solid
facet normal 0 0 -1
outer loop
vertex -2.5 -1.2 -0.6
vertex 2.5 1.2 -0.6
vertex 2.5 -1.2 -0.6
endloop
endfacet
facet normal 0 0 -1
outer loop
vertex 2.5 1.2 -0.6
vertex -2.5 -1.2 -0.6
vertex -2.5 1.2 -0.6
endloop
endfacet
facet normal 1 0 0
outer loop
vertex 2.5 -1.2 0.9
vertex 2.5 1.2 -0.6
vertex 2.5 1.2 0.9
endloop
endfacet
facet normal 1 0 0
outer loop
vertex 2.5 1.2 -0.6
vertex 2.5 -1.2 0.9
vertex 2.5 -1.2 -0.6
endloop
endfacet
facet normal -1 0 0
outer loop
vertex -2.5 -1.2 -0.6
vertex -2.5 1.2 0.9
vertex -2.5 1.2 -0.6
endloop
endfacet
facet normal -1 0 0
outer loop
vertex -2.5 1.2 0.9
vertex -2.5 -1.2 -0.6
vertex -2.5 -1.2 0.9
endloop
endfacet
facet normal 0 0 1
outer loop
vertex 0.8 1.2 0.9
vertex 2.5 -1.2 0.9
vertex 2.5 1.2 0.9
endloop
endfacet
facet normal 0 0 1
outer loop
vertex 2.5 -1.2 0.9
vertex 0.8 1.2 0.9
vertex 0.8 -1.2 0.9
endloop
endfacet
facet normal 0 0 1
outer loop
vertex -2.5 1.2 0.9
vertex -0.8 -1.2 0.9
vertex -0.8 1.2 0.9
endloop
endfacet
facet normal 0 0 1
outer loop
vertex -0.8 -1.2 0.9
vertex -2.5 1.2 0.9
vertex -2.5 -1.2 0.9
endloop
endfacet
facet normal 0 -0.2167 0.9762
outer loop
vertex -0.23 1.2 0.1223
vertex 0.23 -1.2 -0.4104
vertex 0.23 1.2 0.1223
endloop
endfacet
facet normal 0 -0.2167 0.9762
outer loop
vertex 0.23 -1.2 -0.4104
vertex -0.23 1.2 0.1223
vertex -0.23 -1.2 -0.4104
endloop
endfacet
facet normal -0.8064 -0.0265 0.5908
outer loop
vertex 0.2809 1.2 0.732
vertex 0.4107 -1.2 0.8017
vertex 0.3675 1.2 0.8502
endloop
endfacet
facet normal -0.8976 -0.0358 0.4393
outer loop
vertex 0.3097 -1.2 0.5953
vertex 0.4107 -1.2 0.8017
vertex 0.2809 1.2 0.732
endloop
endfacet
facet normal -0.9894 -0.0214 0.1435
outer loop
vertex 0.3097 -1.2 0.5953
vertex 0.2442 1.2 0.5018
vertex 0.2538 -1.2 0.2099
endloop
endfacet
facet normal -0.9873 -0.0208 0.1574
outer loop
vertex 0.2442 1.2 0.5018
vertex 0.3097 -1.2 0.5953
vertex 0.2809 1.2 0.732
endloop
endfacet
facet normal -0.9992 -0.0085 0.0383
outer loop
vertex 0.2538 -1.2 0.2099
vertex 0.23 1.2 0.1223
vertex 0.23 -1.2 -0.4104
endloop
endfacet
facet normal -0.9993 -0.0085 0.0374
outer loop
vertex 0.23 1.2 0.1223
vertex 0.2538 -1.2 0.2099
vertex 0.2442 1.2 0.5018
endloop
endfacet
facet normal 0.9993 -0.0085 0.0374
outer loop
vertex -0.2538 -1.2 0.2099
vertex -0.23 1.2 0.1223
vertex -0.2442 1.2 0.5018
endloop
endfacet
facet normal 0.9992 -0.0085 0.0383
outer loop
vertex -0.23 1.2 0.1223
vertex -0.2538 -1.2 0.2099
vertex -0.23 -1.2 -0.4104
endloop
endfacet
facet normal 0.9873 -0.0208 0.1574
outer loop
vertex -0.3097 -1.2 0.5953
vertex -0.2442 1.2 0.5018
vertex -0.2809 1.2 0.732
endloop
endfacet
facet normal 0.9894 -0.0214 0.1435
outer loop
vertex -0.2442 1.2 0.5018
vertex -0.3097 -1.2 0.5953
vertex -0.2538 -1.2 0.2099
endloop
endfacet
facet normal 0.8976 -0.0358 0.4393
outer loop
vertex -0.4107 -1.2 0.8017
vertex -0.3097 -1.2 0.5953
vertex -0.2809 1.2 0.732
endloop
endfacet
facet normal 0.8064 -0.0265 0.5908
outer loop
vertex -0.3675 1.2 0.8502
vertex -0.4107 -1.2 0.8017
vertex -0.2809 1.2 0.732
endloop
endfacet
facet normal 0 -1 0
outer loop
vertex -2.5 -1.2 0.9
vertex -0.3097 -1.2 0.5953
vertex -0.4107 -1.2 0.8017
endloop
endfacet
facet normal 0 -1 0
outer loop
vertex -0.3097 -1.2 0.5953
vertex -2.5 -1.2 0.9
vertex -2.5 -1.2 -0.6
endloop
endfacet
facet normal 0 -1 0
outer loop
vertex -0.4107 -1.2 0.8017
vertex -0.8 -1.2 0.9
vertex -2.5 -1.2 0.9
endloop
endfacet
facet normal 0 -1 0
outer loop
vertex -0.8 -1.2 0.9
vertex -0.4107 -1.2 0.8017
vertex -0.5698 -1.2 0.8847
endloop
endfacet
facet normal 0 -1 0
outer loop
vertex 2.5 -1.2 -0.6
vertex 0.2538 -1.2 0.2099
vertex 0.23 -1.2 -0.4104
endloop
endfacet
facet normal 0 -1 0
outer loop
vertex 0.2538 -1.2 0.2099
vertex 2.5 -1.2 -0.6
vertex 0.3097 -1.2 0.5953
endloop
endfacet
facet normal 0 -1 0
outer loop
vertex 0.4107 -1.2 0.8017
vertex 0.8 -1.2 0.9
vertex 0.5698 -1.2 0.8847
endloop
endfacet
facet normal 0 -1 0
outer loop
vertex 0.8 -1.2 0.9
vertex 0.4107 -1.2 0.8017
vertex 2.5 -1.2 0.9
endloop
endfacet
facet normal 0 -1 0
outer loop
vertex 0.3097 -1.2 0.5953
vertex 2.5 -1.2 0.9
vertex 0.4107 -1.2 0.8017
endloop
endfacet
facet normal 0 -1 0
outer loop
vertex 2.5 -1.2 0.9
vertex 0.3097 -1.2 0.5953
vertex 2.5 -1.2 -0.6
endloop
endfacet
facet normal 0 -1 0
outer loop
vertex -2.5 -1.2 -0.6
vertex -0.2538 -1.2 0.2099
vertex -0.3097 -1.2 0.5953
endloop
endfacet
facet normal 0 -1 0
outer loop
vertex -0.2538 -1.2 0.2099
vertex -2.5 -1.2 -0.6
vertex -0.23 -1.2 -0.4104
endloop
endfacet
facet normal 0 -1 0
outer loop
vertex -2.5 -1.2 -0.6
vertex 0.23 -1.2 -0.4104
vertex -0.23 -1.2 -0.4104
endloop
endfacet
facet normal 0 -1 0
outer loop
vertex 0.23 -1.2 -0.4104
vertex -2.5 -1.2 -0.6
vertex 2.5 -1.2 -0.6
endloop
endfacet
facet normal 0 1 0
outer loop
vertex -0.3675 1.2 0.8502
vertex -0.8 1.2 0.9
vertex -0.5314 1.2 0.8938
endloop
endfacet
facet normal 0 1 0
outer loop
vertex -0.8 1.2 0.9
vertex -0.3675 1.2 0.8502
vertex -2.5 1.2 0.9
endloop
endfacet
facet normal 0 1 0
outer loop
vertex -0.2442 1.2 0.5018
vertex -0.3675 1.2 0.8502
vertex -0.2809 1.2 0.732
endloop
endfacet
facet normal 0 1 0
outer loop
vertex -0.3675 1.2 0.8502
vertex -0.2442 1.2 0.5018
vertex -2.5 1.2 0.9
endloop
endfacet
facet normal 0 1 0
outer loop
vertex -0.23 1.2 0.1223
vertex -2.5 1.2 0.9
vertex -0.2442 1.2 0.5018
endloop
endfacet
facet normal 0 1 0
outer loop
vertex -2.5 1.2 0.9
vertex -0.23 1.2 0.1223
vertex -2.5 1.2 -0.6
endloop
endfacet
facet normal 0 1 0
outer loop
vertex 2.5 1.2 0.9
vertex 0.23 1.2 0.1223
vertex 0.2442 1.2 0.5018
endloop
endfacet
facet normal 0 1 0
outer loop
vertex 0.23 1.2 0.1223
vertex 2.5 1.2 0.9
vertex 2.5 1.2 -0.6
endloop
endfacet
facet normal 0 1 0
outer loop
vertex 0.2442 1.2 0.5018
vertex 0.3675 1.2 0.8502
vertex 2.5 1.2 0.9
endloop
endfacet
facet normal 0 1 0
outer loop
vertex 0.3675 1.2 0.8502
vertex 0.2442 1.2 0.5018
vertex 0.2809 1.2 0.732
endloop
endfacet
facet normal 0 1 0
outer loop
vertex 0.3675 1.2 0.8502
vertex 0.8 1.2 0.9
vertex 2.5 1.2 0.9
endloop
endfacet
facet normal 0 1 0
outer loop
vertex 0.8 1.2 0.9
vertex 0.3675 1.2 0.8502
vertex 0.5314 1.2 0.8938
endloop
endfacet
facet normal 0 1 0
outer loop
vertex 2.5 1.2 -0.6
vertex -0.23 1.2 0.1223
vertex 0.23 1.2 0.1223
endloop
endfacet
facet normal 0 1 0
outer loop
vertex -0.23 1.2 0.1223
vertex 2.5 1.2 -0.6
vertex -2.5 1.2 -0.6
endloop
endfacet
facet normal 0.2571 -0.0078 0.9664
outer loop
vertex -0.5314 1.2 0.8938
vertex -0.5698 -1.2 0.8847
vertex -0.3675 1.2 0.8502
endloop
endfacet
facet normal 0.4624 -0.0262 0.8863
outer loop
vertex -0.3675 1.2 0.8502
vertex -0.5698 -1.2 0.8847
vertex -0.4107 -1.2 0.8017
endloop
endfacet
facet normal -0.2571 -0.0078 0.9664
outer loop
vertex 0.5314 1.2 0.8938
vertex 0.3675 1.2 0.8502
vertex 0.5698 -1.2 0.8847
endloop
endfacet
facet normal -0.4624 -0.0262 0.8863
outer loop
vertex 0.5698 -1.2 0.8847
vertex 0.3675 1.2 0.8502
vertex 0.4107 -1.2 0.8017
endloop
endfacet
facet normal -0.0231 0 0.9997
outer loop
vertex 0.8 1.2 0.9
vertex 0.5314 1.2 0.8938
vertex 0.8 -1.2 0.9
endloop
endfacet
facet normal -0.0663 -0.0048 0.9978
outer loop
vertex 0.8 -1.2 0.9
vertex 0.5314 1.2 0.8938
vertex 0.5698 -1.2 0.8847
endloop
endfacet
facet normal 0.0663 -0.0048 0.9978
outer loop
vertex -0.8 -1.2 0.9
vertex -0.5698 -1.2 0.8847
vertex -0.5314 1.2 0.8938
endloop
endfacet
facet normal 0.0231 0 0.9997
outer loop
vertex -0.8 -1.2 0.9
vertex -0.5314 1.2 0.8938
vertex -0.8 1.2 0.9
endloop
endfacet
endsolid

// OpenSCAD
// file: ../p/rect2p.scad
use <../lib.scad>
function ldraw_lib__rect2p() = [
// 0 Rectangle with 2 Parallel Edges
// 0 Name: rect2p.dat
// 0 Author: Donald Sutter [technog]
// 0 !LDRAW_ORG Primitive UPDATE 2010-01
// 0 !LICENSE Licensed under CC BY 4.0 : see CAreadme.txt
// 
// 0 BFC CERTIFY CCW
  [0,"BFC","CERTIFY"],
  [0,"BFC","CCW"],
// 
// 0 !HISTORY 2003-08-01 [PTadmin] Official Update 2003-02
// 0 !HISTORY 2007-06-24 [PTadmin] Header formatted for Contributor Agreement
// 0 !HISTORY 2008-07-01 [PTadmin] Official Update 2008-01
// 0 !HISTORY 2010-01-17 [mikeheide] changed winding to CCW
// 0 !HISTORY 2010-04-05 [PTadmin] Official Update 2010-01
// 
// 
// 2 24 1 0 1 -1 0 1
  [2,24,1,0,1,-1,0,1],
// 2 24 -1 0 -1 1 0 -1
  [2,24,-1,0,-1,1,0,-1],
// 4 16 -1 0 1 -1 0 -1 1 0 -1 1 0 1
  [4,16,-1,0,1,-1,0,-1,1,0,-1,1,0,1],
// 0
];
module ldraw_lib__rect2p(step=0, col=false, unit=2/5, alt=false, line=0.2, solid=!$preview)
    makepoly(ldraw_lib__rect2p(), step=step, col=col, unit=unit, alt=alt, line=line, solid=solid);
ldraw_lib__rect2p(line=0.2);
// file: ../p/rect.scad
use <../lib.scad>
function ldraw_lib__rect() = [
// 0 Rectangle
// 0 Name: rect.dat
// 0 Author: James Jessiman
// 0 !LDRAW_ORG Primitive UPDATE 2010-01
// 0 !LICENSE Licensed under CC BY 4.0 : see CAreadme.txt
// 
// 0 BFC CERTIFY CCW
  [0,"BFC","CERTIFY"],
  [0,"BFC","CCW"],
// 
// 0 !HISTORY 2002-04-05 [hafhead] Added BFC statement
// 0 !HISTORY 2002-04-25 [PTadmin] Official Update 2002-02
// 0 !HISTORY 2007-06-24 [PTadmin] Header formatted for Contributor Agreement
// 0 !HISTORY 2008-07-01 [PTadmin] Official Update 2008-01
// 0 !HISTORY 2010-01-17 [mikeheide] changed winding to CCW
// 0 !HISTORY 2010-04-05 [PTadmin] Official Update 2010-01
// 
// 
// 2 24 1 0 1 -1 0 1
  [2,24,1,0,1,-1,0,1],
// 2 24 -1 0 1 -1 0 -1
  [2,24,-1,0,1,-1,0,-1],
// 2 24 -1 0 -1 1 0 -1
  [2,24,-1,0,-1,1,0,-1],
// 2 24 1 0 -1 1 0 1
  [2,24,1,0,-1,1,0,1],
// 4 16 -1 0 1 -1 0 -1 1 0 -1 1 0 1
  [4,16,-1,0,1,-1,0,-1,1,0,-1,1,0,1],
// 0
];
module ldraw_lib__rect(step=0, col=false, unit=2/5, alt=false, line=0.2, solid=!$preview)
    makepoly(ldraw_lib__rect(), step=step, col=col, unit=unit, alt=alt, line=line, solid=solid);
ldraw_lib__rect(line=0.2);
// file: ../p/box3u2p.scad
use <../lib.scad>
function ldraw_lib__box3u2p() = [
// 0 Box with 3 Faces without 2 Parallel Edges
// 0 Name: box3u2p.dat
// 0 Author: Niels Karsdorp [nielsk]
// 0 !LDRAW_ORG Primitive UPDATE 2012-01
// 0 !LICENSE Licensed under CC BY 4.0 : see CAreadme.txt
// 
// 0 BFC CERTIFY CCW
  [0,"BFC","CERTIFY"],
  [0,"BFC","CCW"],
// 
// 0 !HISTORY 2003-03-12 [PTadmin] Official Update 2003-01
// 0 !HISTORY 2007-06-24 [PTadmin] Header formatted for Contributor Agreement
// 0 !HISTORY 2008-07-01 [PTadmin] Official Update 2008-01
// 0 !HISTORY 2012-02-16 [Philo] Changed to CCW
// 0 !HISTORY 2012-03-30 [PTadmin] Official Update 2012-01
// 
// 
// 2 24 1 1 1 -1 1 1
  [2,24,1,1,1,-1,1,1],
// 2 24 -1 1 -1 1 1 -1
  [2,24,-1,1,-1,1,1,-1],
// 2 24 1 0 1 -1 0 1
  [2,24,1,0,1,-1,0,1],
// 2 24 -1 0 -1 1 0 -1
  [2,24,-1,0,-1,1,0,-1],
// 2 24 1 1 1 1 1 -1
  [2,24,1,1,1,1,1,-1],
// 2 24 -1 1 1 -1 1 -1
  [2,24,-1,1,1,-1,1,-1],
// 2 24 1 1 1 1 0 1
  [2,24,1,1,1,1,0,1],
// 2 24 1 1 -1 1 0 -1
  [2,24,1,1,-1,1,0,-1],
// 2 24 -1 1 1 -1 0 1
  [2,24,-1,1,1,-1,0,1],
// 2 24 -1 1 -1 -1 0 -1
  [2,24,-1,1,-1,-1,0,-1],
// 4 16 -1 1 -1 -1 1 1 1 1 1 1 1 -1
  [4,16,-1,1,-1,-1,1,1,1,1,1,1,1,-1],
// 4 16 -1 1 1 -1 0 1 1 0 1 1 1 1
  [4,16,-1,1,1,-1,0,1,1,0,1,1,1,1],
// 4 16 1 1 -1 1 0 -1 -1 0 -1 -1 1 -1
  [4,16,1,1,-1,1,0,-1,-1,0,-1,-1,1,-1],
];
module ldraw_lib__box3u2p(step=0, col=false, unit=2/5, alt=false, line=0.2, solid=!$preview)
    makepoly(ldraw_lib__box3u2p(), step=step, col=col, unit=unit, alt=alt, line=line, solid=solid);
ldraw_lib__box3u2p(line=0.2);
// main file
use <../lib.scad>
use <../p/box3u2p.scad>
use <../p/rect.scad>
use <../p/rect2p.scad>
function ldraw_lib__u9431() = [
// 0 ~Electric Constraction Eyes  4.5 x  2 x  1.5 Light-Up Sponge for LED Anode
// 0 Name: u9431.dat
// 0 Author: Santeri Piippo [arezey]
// 0 !LDRAW_ORG Part UPDATE 2024-05
// 0 !LICENSE Licensed under CC BY 4.0 : see CAreadme.txt
// 
// 0 !HELP Keeps the LED's anode away from the battery while the button is not pressed.
// 
// 0 BFC CERTIFY CCW
  [0,"BFC","CERTIFY"],
  [0,"BFC","CCW"],
// 
// 0 !HISTORY 2023-05-30 [SwampKryakwa] Changed triangulation to avoid convex faces, changed condlines to appear properly, use of rect and box primitives.
// 0 !HISTORY 2024-06-30 [OrionP] Official Update 2024-05
// 
// 
// 1 16 0 -2.25 0 0 0 6.25 0 3.75 0 3 0 0 box3u2p.dat
  [1,16,0,-2.25,0,0,0,6.25,0,3.75,0,3,0,0, ldraw_lib__box3u2p()],
// 1 16 4.125 -2.25 0 2.125 0 0 0 1 0 0 0 3 rect2p.dat
  [1,16,4.125,-2.25,0,2.125,0,0,0,1,0,0,0,3, ldraw_lib__rect2p()],
// 1 16 -4.125 -2.25 0 2.125 0 0 0 1 0 0 0 3 rect2p.dat
  [1,16,-4.125,-2.25,0,2.125,0,0,0,1,0,0,0,3, ldraw_lib__rect2p()],
// 1 16 0 0.360165 0 0.575 0 0 0 1 -0.665935 0 0 3 rect.dat
  [1,16,0,0.360165,0,0.575,0,0,0,1,-0.665935,0,0,3, ldraw_lib__rect()],
// 
// 2 24 1.3286 -2.23445 3 2 -2.25 3
  [2,24,1.3286,-2.23445,3,2,-2.25,3],
// 2 24 0.9188 -2.12557 3 1.3286 -2.23445 3
  [2,24,0.9188,-2.12557,3,1.3286,-2.23445,3],
// 2 24 0.7022 -1.83005 3 0.9188 -2.12557 3
  [2,24,0.7022,-1.83005,3,0.9188,-2.12557,3],
// 2 24 0.6104 -1.25455 3 0.7022 -1.83005 3
  [2,24,0.6104,-1.25455,3,0.7022,-1.83005,3],
// 2 24 0.575 -0.30577 3 0.6104 -1.25455 3
  [2,24,0.575,-0.30577,3,0.6104,-1.25455,3],
// 2 24 -0.575 -0.30577 3 -0.6104 -1.25455 3
  [2,24,-0.575,-0.30577,3,-0.6104,-1.25455,3],
// 2 24 -0.6104 -1.25455 3 -0.7022 -1.83005 3
  [2,24,-0.6104,-1.25455,3,-0.7022,-1.83005,3],
// 2 24 -0.7022 -1.83005 3 -0.9188 -2.12557 3
  [2,24,-0.7022,-1.83005,3,-0.9188,-2.12557,3],
// 2 24 -0.9188 -2.12557 3 -1.3286 -2.23445 3
  [2,24,-0.9188,-2.12557,3,-1.3286,-2.23445,3],
// 2 24 -1.3286 -2.23445 3 -2 -2.25 3
  [2,24,-1.3286,-2.23445,3,-2,-2.25,3],
// 2 24 1.4246 -2.21179 -3 2 -2.25 -3
  [2,24,1.4246,-2.21179,-3,2,-2.25,-3],
// 
// 2 24 1.0268 -2.00433 -3 1.4246 -2.21179 -3
  [2,24,1.0268,-2.00433,-3,1.4246,-2.21179,-3],
// 2 24 0.7742 -1.48836 -3 1.0268 -2.00433 -3
  [2,24,0.7742,-1.48836,-3,1.0268,-2.00433,-3],
// 2 24 0.6344 -0.524637 -3 0.7742 -1.48836 -3
  [2,24,0.6344,-0.524637,-3,0.7742,-1.48836,-3],
// 2 24 0.575 1.0261 -3 0.6344 -0.524637 -3
  [2,24,0.575,1.0261,-3,0.6344,-0.524637,-3],
// 2 24 -0.575 1.0261 -3 -0.6344 -0.524637 -3
  [2,24,-0.575,1.0261,-3,-0.6344,-0.524637,-3],
// 2 24 -0.6344 -0.524637 -3 -0.7742 -1.48836 -3
  [2,24,-0.6344,-0.524637,-3,-0.7742,-1.48836,-3],
// 2 24 -0.7742 -1.48836 -3 -1.0268 -2.00433 -3
  [2,24,-0.7742,-1.48836,-3,-1.0268,-2.00433,-3],
// 2 24 -1.0268 -2.00433 -3 -1.4246 -2.21179 -3
  [2,24,-1.0268,-2.00433,-3,-1.4246,-2.21179,-3],
// 2 24 -1.4246 -2.21179 -3 -2 -2.25 -3
  [2,24,-1.4246,-2.21179,-3,-2,-2.25,-3],
// 3 16 0.7022 -1.83005 3 1.0268 -2.00433 -3 0.9188 -2.12557 3
  [3,16,0.7022,-1.83005,3,1.0268,-2.00433,-3,0.9188,-2.12557,3],
// 3 16 0.7742 -1.48836 -3 1.0268 -2.00433 -3 0.7022 -1.83005 3
  [3,16,0.7742,-1.48836,-3,1.0268,-2.00433,-3,0.7022,-1.83005,3],
// 4 16 0.6344 -0.524637 -3 0.7742 -1.48836 -3 0.7022 -1.83005 3 0.6104 -1.25455 3
  [4,16,0.6344,-0.524637,-3,0.7742,-1.48836,-3,0.7022,-1.83005,3,0.6104,-1.25455,3],
// 4 16 0.575 1.0261 -3 0.6344 -0.524637 -3 0.6104 -1.25455 3 0.575 -0.305769 3
  [4,16,0.575,1.0261,-3,0.6344,-0.524637,-3,0.6104,-1.25455,3,0.575,-0.305769,3],
// 4 16 -0.6104 -1.25455 3 -0.6344 -0.524637 -3 -0.575 1.0261 -3 -0.575 -0.30577 3
  [4,16,-0.6104,-1.25455,3,-0.6344,-0.524637,-3,-0.575,1.0261,-3,-0.575,-0.30577,3],
// 4 16 -0.7022 -1.83005 3 -0.7742 -1.48836 -3 -0.6344 -0.524637 -3 -0.6104 -1.25455 3
  [4,16,-0.7022,-1.83005,3,-0.7742,-1.48836,-3,-0.6344,-0.524637,-3,-0.6104,-1.25455,3],
// 3 16 -1.0268 -2.00433 -3 -0.7742 -1.48836 -3 -0.7022 -1.83005 3
  [3,16,-1.0268,-2.00433,-3,-0.7742,-1.48836,-3,-0.7022,-1.83005,3],
// 3 16 -0.9188 -2.12557 3 -1.0268 -2.00433 -3 -0.7022 -1.83005 3
  [3,16,-0.9188,-2.12557,3,-1.0268,-2.00433,-3,-0.7022,-1.83005,3],
// 5 24 0.7022 -1.83005 3 1.0268 -2.00433 -3 0.9188 -2.12557 3 0.7742 -1.48836 -3
  [5,24,0.7022,-1.83005,3,1.0268,-2.00433,-3,0.9188,-2.12557,3,0.7742,-1.48836,-3],
// 5 24 0.6344 -0.524637 -3 0.6104 -1.25455 3 0.7742 -1.48836 -3 0.575 -0.305769 3
  [5,24,0.6344,-0.524637,-3,0.6104,-1.25455,3,0.7742,-1.48836,-3,0.575,-0.305769,3],
// 4 16 -6.25 -2.25 -3 -6.25 1.5 -3 -0.7742 -1.48836 -3 -1.0268 -2.00433 -3
  [4,16,-6.25,-2.25,-3,-6.25,1.5,-3,-0.7742,-1.48836,-3,-1.0268,-2.00433,-3],
// 4 16 -6.25 -2.25 -3 -1.0268 -2.00433 -3 -1.4246 -2.21179 -3 -2 -2.25 -3
  [4,16,-6.25,-2.25,-3,-1.0268,-2.00433,-3,-1.4246,-2.21179,-3,-2,-2.25,-3],
// 4 16 0.6344 -0.524637 -3 0.575 1.0261 -3 6.25 1.5 -3 0.7742 -1.48836 -3
  [4,16,0.6344,-0.524637,-3,0.575,1.0261,-3,6.25,1.5,-3,0.7742,-1.48836,-3],
// 4 16 2 -2.25 -3 1.4246 -2.21179 -3 1.0268 -2.00433 -3 6.25 -2.25 -3
  [4,16,2,-2.25,-3,1.4246,-2.21179,-3,1.0268,-2.00433,-3,6.25,-2.25,-3],
// 4 16 1.0268 -2.00433 -3 0.7742 -1.48836 -3 6.25 1.5 -3 6.25 -2.25 -3
  [4,16,1.0268,-2.00433,-3,0.7742,-1.48836,-3,6.25,1.5,-3,6.25,-2.25,-3],
// 4 16 -0.7742 -1.48836 -3 -6.25 1.5 -3 -0.575 1.0261 -3 -0.6344 -0.524637 -3
  [4,16,-0.7742,-1.48836,-3,-6.25,1.5,-3,-0.575,1.0261,-3,-0.6344,-0.524637,-3],
// 4 16 -0.575 1.0261 -3 -6.25 1.5 -3 6.25 1.5 -3 0.575 1.0261 -3
  [4,16,-0.575,1.0261,-3,-6.25,1.5,-3,6.25,1.5,-3,0.575,1.0261,-3],
// 4 16 -6.25 -2.25 3 -2 -2.25 3 -1.3286 -2.23445 3 -0.9188 -2.12557 3
  [4,16,-6.25,-2.25,3,-2,-2.25,3,-1.3286,-2.23445,3,-0.9188,-2.12557,3],
// 4 16 -6.25 -2.25 3 -0.9188 -2.12557 3 -0.7022 -1.83005 3 -0.6104 -1.25455 3
  [4,16,-6.25,-2.25,3,-0.9188,-2.12557,3,-0.7022,-1.83005,3,-0.6104,-1.25455,3],
// 4 16 -6.25 -2.25 3 -0.6104 -1.25455 3 -0.575 -0.30577 3 -6.25 1.5 3
  [4,16,-6.25,-2.25,3,-0.6104,-1.25455,3,-0.575,-0.30577,3,-6.25,1.5,3],
// 4 16 6.25 1.5 3 0.575 -0.30577 3 0.6104 -1.25455 3 6.25 -2.25 3
  [4,16,6.25,1.5,3,0.575,-0.30577,3,0.6104,-1.25455,3,6.25,-2.25,3],
// 4 16 0.6104 -1.25455 3 0.7022 -1.83005 3 0.9188 -2.12557 3 6.25 -2.25 3
  [4,16,0.6104,-1.25455,3,0.7022,-1.83005,3,0.9188,-2.12557,3,6.25,-2.25,3],
// 4 16 0.9188 -2.12557 3 1.3286 -2.23445 3 2 -2.25 3 6.25 -2.25 3
  [4,16,0.9188,-2.12557,3,1.3286,-2.23445,3,2,-2.25,3,6.25,-2.25,3],
// 4 16 0.575 -0.305769 3 6.25 1.5 3 -6.25 1.5 3 -0.575 -0.30577 3
  [4,16,0.575,-0.305769,3,6.25,1.5,3,-6.25,1.5,3,-0.575,-0.30577,3],
// 3 16 -1.3286 -2.23445 3 -1.4246 -2.21179 -3 -.9188 -2.12557 3
  [3,16,-1.3286,-2.23445,3,-1.4246,-2.21179,-3,-.9188,-2.12557,3],
// 3 16 -.9188 -2.12557 3 -1.4246 -2.21179 -3 -1.0268 -2.00433 -3
  [3,16,-.9188,-2.12557,3,-1.4246,-2.21179,-3,-1.0268,-2.00433,-3],
// 3 16 1.3286 -2.23445 3 .9188 -2.12557 3 1.4246 -2.21179 -3
  [3,16,1.3286,-2.23445,3,.9188,-2.12557,3,1.4246,-2.21179,-3],
// 3 16 1.4246 -2.21179 -3 .9188 -2.12557 3 1.0268 -2.00433 -3
  [3,16,1.4246,-2.21179,-3,.9188,-2.12557,3,1.0268,-2.00433,-3],
// 5 24 1.4246 -2.21179 -3 .9188 -2.12557 3 1.3286 -2.23445 3 1.0268 -2.00433 -3
  [5,24,1.4246,-2.21179,-3,.9188,-2.12557,3,1.3286,-2.23445,3,1.0268,-2.00433,-3],
// 5 24 .9188 -2.12557 3 1.0268 -2.00433 -3 .7742 -1.48836 -3 1.4246 -2.21179 -3
  [5,24,.9188,-2.12557,3,1.0268,-2.00433,-3,.7742,-1.48836,-3,1.4246,-2.21179,-3],
// 3 16 2 -2.25 3 1.3286 -2.23445 3 2 -2.25 -3
  [3,16,2,-2.25,3,1.3286,-2.23445,3,2,-2.25,-3],
// 3 16 2 -2.25 -3 1.3286 -2.23445 3 1.4246 -2.21179 -3
  [3,16,2,-2.25,-3,1.3286,-2.23445,3,1.4246,-2.21179,-3],
// 3 16 -2 -2.25 -3 -1.4246 -2.21179 -3 -1.3286 -2.23445 3
  [3,16,-2,-2.25,-3,-1.4246,-2.21179,-3,-1.3286,-2.23445,3],
// 3 16 -2 -2.25 -3 -1.3286 -2.23445 3 -2 -2.25 3
  [3,16,-2,-2.25,-3,-1.3286,-2.23445,3,-2,-2.25,3],
// 5 24 2 -2.25 -3 1.3286 -2.23445 3 1.4246 -2.21179 -3 2 -2.25 3
  [5,24,2,-2.25,-3,1.3286,-2.23445,3,1.4246,-2.21179,-3,2,-2.25,3],
// 5 24 .7022 -1.83005 3 .7742 -1.48836 -3 .6344 -.524637 -3 1.0268 -2.00433 -3
  [5,24,.7022,-1.83005,3,.7742,-1.48836,-3,.6344,-.524637,-3,1.0268,-2.00433,-3],
// 5 24 2 -2.25 -3 2 -2.25 3 1.3286 -2.23445 3 6.25 -2.25 3
  [5,24,2,-2.25,-3,2,-2.25,3,1.3286,-2.23445,3,6.25,-2.25,3],
// 5 24 1.3286 -2.23445 3 1.4246 -2.21179 -3 2 -2.25 -3 .9188 -2.12557 3
  [5,24,1.3286,-2.23445,3,1.4246,-2.21179,-3,2,-2.25,-3,.9188,-2.12557,3],
// 5 24 -.7022 -1.83005 3 -1.0268 -2.00433 -3 -.9188 -2.12557 3 -.7742 -1.48836 -3
  [5,24,-.7022,-1.83005,3,-1.0268,-2.00433,-3,-.9188,-2.12557,3,-.7742,-1.48836,-3],
// 5 24 -.6344 -.524637 -3 -.6104 -1.25455 3 -.7742 -1.48836 -3 -.575 -.305769 3
  [5,24,-.6344,-.524637,-3,-.6104,-1.25455,3,-.7742,-1.48836,-3,-.575,-.305769,3],
// 5 24 -1.4246 -2.21179 -3 -.9188 -2.12557 3 -1.3286 -2.23445 3 -1.0268 -2.00433 -3
  [5,24,-1.4246,-2.21179,-3,-.9188,-2.12557,3,-1.3286,-2.23445,3,-1.0268,-2.00433,-3],
// 5 24 -.9188 -2.12557 3 -1.0268 -2.00433 -3 -.7742 -1.48836 -3 -1.4246 -2.21179 -3
  [5,24,-.9188,-2.12557,3,-1.0268,-2.00433,-3,-.7742,-1.48836,-3,-1.4246,-2.21179,-3],
// 5 24 -2 -2.25 -3 -1.3286 -2.23445 3 -1.4246 -2.21179 -3 -2 -2.25 3
  [5,24,-2,-2.25,-3,-1.3286,-2.23445,3,-1.4246,-2.21179,-3,-2,-2.25,3],
// 5 24 -.7022 -1.83005 3 -.7742 -1.48836 -3 -.6344 -.524637 -3 -1.0268 -2.00433 -3
  [5,24,-.7022,-1.83005,3,-.7742,-1.48836,-3,-.6344,-.524637,-3,-1.0268,-2.00433,-3],
// 5 24 -2 -2.25 -3 -2 -2.25 3 -1.3286 -2.23445 3 -6.25 -2.25 3
  [5,24,-2,-2.25,-3,-2,-2.25,3,-1.3286,-2.23445,3,-6.25,-2.25,3],
// 5 24 -1.3286 -2.23445 3 -1.4246 -2.21179 -3 -2 -2.25 -3 -.9188 -2.12557 3
  [5,24,-1.3286,-2.23445,3,-1.4246,-2.21179,-3,-2,-2.25,-3,-.9188,-2.12557,3],
];
module ldraw_lib__u9431(step=0, col=false, unit=2/5, alt=false, line=0.2, solid=!$preview)
    makepoly(ldraw_lib__u9431(), step=step, col=col, unit=unit, alt=alt, line=line, solid=solid);
ldraw_lib__u9431(line=0.2);
